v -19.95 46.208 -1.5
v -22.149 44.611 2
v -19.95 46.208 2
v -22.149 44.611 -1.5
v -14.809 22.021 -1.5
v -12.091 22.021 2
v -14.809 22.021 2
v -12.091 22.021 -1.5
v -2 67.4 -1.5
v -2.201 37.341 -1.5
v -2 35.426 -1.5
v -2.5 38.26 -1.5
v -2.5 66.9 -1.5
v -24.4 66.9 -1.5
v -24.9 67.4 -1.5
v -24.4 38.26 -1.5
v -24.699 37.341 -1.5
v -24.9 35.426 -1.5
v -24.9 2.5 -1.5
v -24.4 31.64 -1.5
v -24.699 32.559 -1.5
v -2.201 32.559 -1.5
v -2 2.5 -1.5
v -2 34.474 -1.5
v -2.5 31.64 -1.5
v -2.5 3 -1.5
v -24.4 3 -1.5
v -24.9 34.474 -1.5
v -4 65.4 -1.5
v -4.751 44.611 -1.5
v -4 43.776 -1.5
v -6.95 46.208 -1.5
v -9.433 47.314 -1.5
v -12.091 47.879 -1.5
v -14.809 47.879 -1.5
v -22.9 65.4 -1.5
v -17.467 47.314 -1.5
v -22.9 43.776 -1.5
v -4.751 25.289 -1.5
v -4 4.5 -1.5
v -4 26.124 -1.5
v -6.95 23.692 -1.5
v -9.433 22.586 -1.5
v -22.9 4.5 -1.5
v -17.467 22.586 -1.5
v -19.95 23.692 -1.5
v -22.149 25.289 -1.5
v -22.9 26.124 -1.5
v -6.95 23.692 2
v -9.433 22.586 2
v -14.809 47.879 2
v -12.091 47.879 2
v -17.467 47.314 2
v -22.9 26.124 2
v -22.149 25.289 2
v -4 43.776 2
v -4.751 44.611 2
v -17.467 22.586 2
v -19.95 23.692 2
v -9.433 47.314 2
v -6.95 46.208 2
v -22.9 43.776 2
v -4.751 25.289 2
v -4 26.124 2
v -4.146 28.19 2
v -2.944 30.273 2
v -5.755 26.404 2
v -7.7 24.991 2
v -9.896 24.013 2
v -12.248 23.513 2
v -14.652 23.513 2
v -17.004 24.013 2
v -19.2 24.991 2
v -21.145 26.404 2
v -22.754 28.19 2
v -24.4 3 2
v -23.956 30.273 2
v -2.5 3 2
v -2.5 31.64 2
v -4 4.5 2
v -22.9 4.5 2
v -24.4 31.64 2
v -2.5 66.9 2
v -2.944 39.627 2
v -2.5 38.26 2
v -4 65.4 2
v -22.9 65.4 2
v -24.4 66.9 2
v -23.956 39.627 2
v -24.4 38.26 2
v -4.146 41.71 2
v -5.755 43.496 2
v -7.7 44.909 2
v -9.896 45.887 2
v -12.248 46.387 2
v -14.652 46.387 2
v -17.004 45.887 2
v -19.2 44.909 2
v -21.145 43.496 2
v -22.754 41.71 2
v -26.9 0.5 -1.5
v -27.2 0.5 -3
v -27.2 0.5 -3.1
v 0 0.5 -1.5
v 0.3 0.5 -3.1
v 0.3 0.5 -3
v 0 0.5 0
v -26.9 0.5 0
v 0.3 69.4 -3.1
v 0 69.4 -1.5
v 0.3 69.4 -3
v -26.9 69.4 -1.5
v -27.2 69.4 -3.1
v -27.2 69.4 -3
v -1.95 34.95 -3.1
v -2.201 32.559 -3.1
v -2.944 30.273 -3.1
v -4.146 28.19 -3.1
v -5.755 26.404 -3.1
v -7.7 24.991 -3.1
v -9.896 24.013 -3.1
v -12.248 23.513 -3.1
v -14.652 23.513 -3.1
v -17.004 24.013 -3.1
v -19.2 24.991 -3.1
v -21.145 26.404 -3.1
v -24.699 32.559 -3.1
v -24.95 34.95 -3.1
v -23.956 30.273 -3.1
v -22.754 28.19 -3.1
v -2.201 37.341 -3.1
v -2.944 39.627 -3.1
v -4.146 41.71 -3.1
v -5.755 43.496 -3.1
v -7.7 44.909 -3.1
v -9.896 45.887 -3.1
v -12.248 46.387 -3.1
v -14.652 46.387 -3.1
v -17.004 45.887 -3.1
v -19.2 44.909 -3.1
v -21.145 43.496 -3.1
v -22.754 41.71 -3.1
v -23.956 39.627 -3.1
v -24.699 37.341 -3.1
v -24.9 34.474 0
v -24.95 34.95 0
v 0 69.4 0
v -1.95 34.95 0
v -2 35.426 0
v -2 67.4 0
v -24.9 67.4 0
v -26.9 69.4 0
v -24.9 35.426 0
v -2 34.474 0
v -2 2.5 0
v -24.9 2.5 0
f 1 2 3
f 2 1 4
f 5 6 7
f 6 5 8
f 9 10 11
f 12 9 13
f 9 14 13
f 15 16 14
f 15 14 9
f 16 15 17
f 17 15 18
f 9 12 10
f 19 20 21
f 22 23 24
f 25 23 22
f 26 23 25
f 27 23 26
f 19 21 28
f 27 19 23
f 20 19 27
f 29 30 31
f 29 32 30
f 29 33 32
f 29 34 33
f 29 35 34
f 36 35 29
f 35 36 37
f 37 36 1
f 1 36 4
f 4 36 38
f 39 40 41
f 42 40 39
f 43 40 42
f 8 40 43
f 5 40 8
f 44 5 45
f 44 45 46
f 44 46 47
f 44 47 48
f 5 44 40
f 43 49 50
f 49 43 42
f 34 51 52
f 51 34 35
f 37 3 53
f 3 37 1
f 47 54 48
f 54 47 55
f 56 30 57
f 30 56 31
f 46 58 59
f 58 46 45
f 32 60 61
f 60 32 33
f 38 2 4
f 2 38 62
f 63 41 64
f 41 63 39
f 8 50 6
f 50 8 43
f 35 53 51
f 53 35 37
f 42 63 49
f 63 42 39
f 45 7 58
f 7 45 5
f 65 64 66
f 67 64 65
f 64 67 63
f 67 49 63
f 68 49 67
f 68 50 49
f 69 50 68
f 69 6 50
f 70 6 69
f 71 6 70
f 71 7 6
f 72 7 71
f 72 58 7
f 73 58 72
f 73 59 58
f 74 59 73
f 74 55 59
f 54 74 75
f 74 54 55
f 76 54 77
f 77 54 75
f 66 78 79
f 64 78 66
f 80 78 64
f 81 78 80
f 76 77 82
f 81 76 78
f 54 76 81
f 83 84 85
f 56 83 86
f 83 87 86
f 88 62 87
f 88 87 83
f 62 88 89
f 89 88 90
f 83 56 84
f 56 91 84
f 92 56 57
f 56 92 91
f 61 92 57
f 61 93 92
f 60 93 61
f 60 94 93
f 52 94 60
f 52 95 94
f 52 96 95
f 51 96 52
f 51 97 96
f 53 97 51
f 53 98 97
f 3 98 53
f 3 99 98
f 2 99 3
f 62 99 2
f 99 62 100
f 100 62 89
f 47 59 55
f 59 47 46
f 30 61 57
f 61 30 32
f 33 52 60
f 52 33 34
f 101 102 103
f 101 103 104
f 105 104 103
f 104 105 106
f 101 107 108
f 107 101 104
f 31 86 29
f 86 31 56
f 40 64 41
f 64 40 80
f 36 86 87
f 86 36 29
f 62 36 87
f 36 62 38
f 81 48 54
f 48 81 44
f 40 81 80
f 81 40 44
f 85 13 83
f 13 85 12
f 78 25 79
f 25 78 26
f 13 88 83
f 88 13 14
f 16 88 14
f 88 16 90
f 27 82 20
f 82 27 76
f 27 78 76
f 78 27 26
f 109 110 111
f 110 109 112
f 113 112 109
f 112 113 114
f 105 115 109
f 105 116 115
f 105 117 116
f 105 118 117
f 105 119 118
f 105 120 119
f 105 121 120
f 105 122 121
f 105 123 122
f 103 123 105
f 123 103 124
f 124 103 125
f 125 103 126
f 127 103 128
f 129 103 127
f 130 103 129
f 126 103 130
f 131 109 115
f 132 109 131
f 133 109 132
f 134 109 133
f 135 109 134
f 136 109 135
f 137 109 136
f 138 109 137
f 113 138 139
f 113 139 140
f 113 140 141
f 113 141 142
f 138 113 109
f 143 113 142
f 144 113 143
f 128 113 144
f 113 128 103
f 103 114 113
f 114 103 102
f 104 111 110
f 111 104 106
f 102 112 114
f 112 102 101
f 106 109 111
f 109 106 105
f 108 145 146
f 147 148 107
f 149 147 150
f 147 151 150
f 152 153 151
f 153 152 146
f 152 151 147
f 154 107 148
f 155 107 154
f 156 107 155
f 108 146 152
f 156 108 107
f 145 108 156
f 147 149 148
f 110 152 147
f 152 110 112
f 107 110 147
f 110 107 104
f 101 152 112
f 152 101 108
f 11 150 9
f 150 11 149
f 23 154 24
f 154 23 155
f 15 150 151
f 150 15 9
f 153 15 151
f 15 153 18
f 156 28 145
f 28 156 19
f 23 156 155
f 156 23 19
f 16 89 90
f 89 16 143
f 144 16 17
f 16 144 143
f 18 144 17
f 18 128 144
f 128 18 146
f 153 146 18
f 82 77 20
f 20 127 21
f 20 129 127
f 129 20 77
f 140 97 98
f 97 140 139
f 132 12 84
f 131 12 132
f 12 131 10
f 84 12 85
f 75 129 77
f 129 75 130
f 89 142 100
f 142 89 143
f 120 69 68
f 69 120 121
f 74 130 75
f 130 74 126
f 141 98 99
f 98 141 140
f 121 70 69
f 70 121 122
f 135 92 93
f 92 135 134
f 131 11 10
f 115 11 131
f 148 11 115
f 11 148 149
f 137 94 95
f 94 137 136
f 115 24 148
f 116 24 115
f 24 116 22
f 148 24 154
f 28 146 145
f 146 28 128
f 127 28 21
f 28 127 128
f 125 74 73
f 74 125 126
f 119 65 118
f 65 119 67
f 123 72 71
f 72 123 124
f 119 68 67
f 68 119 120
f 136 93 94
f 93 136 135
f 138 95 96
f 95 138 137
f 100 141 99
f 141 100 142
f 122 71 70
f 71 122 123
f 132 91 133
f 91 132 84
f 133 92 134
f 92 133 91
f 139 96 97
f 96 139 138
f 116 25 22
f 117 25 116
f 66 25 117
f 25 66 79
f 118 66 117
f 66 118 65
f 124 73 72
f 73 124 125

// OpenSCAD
/* Diffuser Lense For A Particular Project (OpenSCAD) */
tol = 0.1;

/* LED PCB */
holedia   = 16;

/* Diffuser spec */
thickness = 1.5;
standoff = 1.5;
holediffuser = holedia+7;

/* Camera Chamber */
camchamberw_org = 27;
camchamberh_org = 70;

camchamberw = camchamberw_org - tol;
camchamberh = camchamberh_org - tol -1;



/* Enclosure hole */
enclosurew = 19;

rotate([0,180])
{

/* Diffuser */
translate([0, 1/2, 0])
difference()
{
  union()
  {

    // Diffuser Body
    translate([0, 0, standoff])
    {
      hull()
      {
        translate([0, 0, 0])
          cube([camchamberw,camchamberh,0.1], center = false);
        translate([-0.6/2, 0, thickness])
          cube([camchamberw+0.6,camchamberh,0.1], center = false);
      }
    }
    
    // Standoff
    
    linear_extrude(height = standoff) 
    {
       difference() 
      {
       offset(r = 0) 
        square(size = [camchamberw,camchamberh], center = false);
       offset(r = -2) 
        square(size = [camchamberw,camchamberh], center = false);
      }
    }
    
    difference()
    {
      union()
      {
        translate([camchamberw/2,camchamberh/2,-2])
          cylinder(standoff+2,d=holediffuser+3);
        translate([0,0,-2])
          linear_extrude(height = 4)
          {
            difference() 
            {
             offset(r = 0) 
              square(size = [camchamberw,camchamberh], center = false);
             offset(r = -4) 
              square(size = [camchamberw,camchamberh], center = false);
            }
          }
      }
      translate([0,0,-3])
        linear_extrude(height = standoff+3)
        {
          difference() 
          {
           offset(r = 0) 
            square(size = [camchamberw,camchamberh], center = false);
           offset(r = -2.5) 
            square(size = [camchamberw,camchamberh], center = false);
          }
        }
    }
  }
  translate([camchamberw/2,camchamberh/2,-thickness/2-2])
    cylinder((standoff+thickness+2)*2,d=holediffuser);
}

/* Camera Frame Model */
%translate([-tol/2,-tol/2,-2])
union()
{
  %linear_extrude(height = 2) 
  {
     difference() 
    {
       offset(r = 0) 
        square(size = [camchamberw_org,camchamberh_org], center = false);
       offset(r = -2) 
        square(size = [camchamberw_org,camchamberh_org], center = false);
     }
  }
  %translate([camchamberw_org/2,camchamberh_org/2,-thickness/2])
     cylinder(thickness,d=holedia);
}

}
